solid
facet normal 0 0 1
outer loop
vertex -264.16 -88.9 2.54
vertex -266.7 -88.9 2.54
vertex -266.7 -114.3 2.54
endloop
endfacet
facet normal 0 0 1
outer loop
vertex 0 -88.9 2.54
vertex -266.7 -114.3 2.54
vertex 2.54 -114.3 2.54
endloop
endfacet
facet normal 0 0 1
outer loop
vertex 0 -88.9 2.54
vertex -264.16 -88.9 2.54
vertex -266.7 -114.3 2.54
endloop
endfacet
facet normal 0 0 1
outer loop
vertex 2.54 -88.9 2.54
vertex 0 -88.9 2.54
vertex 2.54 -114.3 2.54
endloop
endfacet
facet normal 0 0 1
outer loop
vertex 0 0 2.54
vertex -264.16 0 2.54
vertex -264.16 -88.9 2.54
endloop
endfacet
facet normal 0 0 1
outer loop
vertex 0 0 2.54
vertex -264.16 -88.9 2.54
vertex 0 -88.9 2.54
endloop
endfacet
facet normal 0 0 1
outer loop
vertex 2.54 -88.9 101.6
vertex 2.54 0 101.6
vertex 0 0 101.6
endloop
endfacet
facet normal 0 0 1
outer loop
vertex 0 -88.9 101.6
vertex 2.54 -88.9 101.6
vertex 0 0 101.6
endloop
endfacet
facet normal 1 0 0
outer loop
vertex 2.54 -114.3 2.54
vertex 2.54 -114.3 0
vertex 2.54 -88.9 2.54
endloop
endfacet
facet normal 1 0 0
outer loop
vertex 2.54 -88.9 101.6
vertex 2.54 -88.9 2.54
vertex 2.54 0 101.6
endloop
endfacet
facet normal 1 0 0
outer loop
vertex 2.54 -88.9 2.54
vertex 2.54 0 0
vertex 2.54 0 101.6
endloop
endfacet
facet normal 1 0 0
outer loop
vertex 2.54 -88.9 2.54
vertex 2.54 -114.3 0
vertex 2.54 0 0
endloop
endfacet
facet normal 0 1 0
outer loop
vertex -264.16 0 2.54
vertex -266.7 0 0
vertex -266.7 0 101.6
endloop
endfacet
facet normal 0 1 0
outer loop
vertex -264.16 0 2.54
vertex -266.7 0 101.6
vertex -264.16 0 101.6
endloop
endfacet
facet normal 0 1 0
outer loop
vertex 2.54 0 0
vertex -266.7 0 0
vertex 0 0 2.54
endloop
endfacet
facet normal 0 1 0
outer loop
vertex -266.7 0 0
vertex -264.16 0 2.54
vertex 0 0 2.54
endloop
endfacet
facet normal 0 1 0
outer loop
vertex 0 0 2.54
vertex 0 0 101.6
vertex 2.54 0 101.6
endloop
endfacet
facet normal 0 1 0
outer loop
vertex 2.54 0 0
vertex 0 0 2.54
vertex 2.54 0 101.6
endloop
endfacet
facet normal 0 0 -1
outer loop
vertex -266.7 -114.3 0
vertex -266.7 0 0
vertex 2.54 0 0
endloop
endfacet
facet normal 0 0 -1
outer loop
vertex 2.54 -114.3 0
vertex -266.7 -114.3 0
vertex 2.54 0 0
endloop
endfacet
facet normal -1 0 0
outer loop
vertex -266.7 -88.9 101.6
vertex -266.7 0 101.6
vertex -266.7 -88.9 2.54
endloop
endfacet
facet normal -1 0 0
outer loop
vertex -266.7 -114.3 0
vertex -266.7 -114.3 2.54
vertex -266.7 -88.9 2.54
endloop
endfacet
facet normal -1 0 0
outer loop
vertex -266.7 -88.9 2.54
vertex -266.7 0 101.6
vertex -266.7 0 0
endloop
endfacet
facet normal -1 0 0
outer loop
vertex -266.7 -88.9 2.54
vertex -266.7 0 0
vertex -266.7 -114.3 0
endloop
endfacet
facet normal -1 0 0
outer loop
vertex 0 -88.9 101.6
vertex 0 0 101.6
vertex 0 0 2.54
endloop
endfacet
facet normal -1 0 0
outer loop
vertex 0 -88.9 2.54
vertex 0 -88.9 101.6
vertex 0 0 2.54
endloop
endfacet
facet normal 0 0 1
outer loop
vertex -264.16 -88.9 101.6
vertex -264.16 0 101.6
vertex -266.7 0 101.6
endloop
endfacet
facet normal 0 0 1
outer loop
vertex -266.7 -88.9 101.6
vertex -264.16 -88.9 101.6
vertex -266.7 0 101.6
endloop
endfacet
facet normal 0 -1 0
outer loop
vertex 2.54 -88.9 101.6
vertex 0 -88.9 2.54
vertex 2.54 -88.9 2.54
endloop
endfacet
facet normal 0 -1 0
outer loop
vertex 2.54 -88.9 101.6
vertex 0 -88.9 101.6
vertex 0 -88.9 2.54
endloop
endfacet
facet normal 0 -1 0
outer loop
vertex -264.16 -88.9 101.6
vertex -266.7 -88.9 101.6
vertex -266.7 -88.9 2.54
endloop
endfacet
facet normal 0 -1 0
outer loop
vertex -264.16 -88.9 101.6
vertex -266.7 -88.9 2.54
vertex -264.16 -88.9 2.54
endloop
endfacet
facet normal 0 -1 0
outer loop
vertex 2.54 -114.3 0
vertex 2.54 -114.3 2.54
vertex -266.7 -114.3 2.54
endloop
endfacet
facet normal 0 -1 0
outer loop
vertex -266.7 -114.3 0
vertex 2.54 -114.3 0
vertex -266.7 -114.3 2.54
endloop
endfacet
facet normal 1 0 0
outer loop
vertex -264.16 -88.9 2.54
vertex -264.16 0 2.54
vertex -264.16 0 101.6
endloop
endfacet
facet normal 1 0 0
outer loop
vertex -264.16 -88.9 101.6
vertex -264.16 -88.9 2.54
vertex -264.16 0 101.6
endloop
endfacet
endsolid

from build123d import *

# Parameters (mm, degrees)
F0_W     = 264.16
F0_H     = 2.54
F1_DEPTH = 88.9
F3_DEPTH = 114.3


with BuildPart() as f1:
    # F0 (on Front) → F1 (new body)
    with BuildSketch(Plane.XZ):
        with Locations((-132.08, 1.27)):
            Rectangle(F0_W, F0_H)
        Polygon((0, 2.54), (0, 0), (2.54, 0), (2.54, 101.6), (0, 101.6), align=None)
        Polygon((-266.7, 0), (-264.16, 0), (-264.16, 2.54), (-264.16, 101.6), (-266.7, 101.6), align=None)
    extrude(amount=F1_DEPTH)

    # F2 (on face) → F3 (join)
    with BuildSketch(Plane(origin=(0, 0, 0), x_dir=(-1, 0, 0), z_dir=(0, 1, 0))):
        Polygon((266.7, 2.54), (264.16, 2.54), (0, 2.54), (-2.54, 2.54), (-2.54, 0), (266.7, 0), align=None)
    extrude(amount=-F3_DEPTH)


solid = f1.part
